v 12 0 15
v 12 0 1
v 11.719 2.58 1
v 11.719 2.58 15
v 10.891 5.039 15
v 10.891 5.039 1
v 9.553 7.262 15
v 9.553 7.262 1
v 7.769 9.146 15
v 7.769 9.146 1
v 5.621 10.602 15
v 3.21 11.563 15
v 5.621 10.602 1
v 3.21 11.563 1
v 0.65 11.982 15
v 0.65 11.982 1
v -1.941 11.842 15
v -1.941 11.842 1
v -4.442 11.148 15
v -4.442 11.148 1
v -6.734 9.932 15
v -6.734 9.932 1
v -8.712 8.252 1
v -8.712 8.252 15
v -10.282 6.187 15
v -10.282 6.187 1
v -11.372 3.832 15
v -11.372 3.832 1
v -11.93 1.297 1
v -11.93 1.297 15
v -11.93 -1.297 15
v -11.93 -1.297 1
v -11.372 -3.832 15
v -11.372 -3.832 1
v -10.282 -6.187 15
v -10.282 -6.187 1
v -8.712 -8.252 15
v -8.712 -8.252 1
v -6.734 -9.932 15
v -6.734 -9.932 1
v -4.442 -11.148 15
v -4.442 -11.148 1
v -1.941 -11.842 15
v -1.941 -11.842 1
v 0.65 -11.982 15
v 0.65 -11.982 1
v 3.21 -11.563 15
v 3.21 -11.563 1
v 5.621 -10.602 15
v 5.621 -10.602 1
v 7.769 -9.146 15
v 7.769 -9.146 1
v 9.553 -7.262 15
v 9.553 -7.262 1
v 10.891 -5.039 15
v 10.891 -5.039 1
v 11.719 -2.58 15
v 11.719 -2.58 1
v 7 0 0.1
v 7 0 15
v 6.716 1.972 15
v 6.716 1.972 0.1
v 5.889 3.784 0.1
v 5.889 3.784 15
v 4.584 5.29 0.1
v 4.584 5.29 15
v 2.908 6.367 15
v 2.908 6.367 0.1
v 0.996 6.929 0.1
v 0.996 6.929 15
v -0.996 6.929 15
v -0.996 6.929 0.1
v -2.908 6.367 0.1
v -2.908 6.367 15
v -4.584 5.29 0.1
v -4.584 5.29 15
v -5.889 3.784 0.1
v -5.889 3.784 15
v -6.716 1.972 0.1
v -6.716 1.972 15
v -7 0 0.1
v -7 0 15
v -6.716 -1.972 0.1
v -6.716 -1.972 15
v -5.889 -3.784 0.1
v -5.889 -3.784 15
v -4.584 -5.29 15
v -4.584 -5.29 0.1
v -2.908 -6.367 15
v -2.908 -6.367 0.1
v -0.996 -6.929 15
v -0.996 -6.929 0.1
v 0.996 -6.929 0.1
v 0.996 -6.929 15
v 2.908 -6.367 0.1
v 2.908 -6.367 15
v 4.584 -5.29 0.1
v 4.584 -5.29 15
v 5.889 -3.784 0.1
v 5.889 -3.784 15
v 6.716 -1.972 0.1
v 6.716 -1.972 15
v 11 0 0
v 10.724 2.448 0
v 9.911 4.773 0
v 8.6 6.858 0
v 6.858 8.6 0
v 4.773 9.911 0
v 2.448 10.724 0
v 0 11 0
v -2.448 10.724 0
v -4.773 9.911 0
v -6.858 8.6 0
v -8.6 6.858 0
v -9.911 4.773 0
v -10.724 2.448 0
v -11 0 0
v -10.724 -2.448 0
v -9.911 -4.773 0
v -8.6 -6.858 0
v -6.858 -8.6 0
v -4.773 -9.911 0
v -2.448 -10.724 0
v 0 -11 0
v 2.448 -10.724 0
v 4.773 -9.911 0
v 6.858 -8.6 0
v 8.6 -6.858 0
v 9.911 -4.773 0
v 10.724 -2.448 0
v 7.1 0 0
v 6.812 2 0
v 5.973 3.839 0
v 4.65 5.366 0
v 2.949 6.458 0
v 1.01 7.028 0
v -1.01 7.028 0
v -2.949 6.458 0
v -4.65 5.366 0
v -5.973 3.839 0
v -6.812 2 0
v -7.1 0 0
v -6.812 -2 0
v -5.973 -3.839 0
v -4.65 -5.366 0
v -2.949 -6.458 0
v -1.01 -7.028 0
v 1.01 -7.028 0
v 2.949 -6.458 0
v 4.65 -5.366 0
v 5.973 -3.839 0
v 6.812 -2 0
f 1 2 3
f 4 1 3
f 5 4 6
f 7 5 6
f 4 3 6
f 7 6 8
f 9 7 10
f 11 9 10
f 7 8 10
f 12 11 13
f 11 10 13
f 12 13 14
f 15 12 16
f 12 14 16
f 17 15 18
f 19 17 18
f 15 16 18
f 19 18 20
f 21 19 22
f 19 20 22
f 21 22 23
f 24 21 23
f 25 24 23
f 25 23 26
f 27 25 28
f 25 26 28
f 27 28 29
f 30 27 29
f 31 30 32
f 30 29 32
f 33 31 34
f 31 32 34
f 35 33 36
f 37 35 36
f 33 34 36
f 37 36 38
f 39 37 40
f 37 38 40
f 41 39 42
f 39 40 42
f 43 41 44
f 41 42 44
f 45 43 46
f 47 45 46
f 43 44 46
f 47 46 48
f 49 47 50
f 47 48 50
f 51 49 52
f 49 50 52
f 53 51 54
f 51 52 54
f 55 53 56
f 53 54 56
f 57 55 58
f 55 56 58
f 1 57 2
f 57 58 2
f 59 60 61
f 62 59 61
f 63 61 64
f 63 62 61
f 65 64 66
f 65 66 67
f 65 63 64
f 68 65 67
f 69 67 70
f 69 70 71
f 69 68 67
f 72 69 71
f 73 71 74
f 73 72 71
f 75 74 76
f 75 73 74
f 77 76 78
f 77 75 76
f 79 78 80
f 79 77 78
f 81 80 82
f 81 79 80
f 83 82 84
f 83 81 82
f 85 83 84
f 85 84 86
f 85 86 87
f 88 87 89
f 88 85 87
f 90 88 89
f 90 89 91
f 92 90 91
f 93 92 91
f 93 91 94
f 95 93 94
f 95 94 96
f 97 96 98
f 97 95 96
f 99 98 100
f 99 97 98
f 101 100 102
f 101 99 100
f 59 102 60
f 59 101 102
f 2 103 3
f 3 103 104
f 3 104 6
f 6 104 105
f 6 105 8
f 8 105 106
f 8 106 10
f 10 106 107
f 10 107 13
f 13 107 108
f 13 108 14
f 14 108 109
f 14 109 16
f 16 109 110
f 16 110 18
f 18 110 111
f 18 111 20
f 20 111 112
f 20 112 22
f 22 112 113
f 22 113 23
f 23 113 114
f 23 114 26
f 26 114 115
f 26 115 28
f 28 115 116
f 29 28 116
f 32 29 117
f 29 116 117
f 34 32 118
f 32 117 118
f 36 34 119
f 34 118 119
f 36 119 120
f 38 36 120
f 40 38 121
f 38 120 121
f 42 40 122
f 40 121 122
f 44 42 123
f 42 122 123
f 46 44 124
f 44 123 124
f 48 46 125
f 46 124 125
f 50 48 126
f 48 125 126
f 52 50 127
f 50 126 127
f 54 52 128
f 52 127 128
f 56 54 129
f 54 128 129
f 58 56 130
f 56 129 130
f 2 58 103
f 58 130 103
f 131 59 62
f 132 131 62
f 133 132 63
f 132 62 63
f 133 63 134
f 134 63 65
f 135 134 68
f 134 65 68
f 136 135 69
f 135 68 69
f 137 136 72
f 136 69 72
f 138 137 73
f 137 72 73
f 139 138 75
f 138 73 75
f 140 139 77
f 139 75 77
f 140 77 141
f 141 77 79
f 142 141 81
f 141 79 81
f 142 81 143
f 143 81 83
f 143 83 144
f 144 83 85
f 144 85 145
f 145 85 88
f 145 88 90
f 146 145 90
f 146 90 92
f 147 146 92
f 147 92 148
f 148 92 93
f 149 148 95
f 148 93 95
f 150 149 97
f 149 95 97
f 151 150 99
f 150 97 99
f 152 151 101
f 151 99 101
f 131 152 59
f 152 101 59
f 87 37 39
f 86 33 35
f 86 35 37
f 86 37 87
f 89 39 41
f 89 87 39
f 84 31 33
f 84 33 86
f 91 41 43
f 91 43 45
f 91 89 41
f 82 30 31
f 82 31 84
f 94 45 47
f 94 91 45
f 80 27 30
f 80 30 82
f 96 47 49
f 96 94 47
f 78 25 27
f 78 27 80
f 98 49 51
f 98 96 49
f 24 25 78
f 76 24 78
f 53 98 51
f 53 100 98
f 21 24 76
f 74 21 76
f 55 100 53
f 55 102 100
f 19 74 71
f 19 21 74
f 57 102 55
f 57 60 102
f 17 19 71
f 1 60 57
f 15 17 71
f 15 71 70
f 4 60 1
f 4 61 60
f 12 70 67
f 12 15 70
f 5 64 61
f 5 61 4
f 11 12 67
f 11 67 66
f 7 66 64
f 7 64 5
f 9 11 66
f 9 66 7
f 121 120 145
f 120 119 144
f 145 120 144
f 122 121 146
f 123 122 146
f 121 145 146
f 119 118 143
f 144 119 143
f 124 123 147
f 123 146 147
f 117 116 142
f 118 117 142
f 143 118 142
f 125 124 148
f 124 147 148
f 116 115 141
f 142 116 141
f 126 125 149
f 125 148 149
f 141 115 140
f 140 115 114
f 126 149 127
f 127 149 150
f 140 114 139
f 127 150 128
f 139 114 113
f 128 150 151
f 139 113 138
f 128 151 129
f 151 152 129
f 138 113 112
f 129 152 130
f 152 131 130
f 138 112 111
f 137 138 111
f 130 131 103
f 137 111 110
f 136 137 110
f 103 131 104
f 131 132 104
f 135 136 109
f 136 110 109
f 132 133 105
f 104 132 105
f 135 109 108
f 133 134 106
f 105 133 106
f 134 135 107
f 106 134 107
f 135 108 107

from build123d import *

# Parameters (mm, degrees)
F0_R     = 12
F0_R_2   = 7
F1_DEPTH = 15
F2_SIZE  = 1
F3_SIZE  = 0.1


with BuildPart() as f1:
    # F0 (on Top) → F1 (new body)
    with BuildSketch(Plane.XY):
        Circle(F0_R)
        Circle(F0_R_2, mode=Mode.SUBTRACT)
    extrude(amount=F1_DEPTH)

    # F2
    f2_edges = [f1.edges().sort_by_distance(p)[0] for p in [
        (-12, 0, 0),
    ]]
    chamfer(f2_edges, length=F2_SIZE)

    # F3
    f3_edges = [f1.edges().sort_by_distance(p)[0] for p in [
        (-7, 0, 0),
    ]]
    chamfer(f3_edges, length=F3_SIZE)


solid = f1.part
